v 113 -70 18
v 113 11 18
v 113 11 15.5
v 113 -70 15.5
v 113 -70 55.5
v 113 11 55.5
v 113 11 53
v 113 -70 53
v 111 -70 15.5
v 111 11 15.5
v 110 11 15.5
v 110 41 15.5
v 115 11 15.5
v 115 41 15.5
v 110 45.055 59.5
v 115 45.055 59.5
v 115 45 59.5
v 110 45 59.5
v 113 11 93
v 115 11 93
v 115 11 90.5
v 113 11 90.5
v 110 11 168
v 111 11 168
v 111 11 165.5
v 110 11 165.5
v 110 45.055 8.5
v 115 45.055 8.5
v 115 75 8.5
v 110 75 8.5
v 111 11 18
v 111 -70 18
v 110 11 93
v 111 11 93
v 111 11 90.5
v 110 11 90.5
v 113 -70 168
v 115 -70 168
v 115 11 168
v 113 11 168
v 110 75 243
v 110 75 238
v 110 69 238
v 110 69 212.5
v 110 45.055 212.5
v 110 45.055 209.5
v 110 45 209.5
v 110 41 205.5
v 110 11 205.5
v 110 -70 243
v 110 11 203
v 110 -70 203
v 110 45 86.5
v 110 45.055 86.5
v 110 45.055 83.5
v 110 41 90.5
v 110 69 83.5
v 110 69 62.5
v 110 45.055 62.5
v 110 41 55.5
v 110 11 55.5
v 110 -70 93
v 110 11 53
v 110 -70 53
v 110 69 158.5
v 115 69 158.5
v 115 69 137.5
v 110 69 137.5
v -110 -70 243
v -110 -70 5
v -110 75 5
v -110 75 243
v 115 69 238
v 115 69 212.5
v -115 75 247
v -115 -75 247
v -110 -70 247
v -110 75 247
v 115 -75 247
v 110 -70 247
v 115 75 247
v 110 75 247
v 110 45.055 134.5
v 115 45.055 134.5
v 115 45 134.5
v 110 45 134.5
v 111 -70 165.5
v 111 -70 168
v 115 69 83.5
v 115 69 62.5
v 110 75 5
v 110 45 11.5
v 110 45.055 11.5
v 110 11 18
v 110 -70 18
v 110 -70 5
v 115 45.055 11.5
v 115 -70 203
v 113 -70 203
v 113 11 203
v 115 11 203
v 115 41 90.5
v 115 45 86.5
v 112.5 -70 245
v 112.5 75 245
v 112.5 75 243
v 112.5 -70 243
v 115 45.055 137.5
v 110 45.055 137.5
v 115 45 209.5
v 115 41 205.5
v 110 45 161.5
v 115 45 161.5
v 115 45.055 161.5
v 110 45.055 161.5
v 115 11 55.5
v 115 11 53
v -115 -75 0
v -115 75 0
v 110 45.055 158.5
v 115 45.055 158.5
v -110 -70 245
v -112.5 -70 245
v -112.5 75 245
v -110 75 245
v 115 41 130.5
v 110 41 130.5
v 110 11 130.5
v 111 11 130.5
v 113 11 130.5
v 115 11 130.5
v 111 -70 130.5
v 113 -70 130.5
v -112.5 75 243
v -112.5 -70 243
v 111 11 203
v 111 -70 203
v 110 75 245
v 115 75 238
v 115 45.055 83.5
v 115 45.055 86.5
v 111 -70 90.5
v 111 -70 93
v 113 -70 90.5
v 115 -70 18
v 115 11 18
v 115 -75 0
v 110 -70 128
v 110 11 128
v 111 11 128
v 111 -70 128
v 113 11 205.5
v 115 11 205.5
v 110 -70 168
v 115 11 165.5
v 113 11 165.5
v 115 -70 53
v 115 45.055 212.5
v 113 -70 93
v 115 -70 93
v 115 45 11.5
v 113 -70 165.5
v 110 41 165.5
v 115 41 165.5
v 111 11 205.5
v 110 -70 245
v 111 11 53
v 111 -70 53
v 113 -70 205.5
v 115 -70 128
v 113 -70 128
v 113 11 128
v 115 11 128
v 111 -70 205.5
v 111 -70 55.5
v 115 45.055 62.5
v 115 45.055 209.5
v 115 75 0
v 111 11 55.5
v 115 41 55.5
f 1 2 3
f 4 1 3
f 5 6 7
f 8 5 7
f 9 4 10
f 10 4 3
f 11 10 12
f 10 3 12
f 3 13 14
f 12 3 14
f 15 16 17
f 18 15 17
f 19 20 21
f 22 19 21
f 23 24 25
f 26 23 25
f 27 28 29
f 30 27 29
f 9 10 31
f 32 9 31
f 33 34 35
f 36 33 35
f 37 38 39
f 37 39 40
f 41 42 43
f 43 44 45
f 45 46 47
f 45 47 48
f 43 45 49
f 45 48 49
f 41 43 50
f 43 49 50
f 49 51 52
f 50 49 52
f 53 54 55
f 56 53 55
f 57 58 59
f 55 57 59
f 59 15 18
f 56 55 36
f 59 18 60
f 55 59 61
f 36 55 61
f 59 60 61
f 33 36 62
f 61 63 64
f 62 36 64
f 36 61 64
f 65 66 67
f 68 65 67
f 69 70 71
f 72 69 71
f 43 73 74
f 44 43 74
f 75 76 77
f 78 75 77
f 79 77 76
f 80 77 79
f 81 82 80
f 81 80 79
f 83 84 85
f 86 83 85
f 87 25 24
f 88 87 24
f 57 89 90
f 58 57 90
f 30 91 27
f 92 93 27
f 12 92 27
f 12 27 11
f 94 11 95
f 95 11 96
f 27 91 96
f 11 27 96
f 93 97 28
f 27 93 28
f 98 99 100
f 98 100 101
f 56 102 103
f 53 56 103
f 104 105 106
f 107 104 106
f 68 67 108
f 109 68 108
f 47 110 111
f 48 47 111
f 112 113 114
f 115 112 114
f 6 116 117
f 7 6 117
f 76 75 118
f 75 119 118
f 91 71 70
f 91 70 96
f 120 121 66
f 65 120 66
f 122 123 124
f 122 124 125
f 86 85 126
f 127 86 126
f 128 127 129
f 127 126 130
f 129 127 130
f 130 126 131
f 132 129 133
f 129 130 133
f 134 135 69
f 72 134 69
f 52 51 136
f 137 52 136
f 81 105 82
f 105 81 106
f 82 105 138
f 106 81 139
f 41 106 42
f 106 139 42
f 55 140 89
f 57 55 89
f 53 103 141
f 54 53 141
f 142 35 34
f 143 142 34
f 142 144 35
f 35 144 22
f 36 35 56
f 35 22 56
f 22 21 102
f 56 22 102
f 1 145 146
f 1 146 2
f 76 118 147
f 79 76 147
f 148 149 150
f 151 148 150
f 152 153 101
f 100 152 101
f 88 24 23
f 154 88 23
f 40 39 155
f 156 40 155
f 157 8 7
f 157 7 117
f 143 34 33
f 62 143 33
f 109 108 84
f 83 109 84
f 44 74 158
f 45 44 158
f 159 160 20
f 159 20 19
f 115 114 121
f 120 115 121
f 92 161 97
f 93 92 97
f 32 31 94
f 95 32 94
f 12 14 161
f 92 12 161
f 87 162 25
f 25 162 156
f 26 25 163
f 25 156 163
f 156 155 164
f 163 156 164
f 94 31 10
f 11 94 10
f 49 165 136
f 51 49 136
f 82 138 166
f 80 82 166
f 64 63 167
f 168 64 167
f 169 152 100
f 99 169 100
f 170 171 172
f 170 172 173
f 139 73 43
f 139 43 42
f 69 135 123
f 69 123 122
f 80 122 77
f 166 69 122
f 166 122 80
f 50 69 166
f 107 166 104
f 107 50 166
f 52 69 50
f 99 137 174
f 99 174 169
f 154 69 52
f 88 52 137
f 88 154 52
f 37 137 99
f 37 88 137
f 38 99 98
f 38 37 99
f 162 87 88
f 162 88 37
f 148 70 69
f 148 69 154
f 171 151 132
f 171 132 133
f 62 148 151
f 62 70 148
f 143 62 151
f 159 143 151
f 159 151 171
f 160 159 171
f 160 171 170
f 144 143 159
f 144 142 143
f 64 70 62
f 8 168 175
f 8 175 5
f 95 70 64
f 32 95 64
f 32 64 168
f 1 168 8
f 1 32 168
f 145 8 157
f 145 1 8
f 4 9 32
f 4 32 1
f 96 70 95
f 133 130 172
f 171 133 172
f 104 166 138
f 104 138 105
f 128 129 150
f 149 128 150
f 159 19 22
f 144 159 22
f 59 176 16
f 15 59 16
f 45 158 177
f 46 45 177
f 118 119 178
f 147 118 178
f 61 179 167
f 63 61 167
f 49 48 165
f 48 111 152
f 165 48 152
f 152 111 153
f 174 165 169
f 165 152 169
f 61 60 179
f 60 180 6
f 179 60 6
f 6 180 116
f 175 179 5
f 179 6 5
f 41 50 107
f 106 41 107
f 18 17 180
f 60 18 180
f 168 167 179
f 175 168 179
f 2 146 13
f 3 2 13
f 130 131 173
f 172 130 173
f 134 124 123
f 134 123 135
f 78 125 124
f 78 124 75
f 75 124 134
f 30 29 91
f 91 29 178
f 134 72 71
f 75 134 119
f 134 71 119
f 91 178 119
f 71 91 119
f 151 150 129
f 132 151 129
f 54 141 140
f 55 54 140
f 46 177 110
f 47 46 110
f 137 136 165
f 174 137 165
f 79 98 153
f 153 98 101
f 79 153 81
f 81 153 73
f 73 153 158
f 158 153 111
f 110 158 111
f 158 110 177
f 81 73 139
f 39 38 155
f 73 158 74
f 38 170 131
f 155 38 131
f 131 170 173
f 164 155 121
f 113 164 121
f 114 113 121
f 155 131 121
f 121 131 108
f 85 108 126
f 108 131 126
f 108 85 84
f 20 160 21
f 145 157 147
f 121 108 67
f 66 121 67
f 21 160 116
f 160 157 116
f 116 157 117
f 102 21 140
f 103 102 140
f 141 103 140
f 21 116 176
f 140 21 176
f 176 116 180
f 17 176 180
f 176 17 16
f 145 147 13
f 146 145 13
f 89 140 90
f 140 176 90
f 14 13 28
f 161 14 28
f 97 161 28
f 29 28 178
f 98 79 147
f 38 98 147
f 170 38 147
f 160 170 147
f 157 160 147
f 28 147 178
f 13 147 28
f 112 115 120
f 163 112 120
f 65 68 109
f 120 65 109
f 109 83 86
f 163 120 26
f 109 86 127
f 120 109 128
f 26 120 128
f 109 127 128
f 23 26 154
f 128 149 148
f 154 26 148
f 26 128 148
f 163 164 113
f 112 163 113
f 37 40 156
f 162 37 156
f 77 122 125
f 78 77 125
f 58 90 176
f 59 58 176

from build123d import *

# Parameters (mm, degrees)
SZKIC1_W                    = 230
SZKIC1_H                    = 150
DODANIE_WYCI_GNI_CIE1_DEPTH = 5
DODANIE_WYCI_GNI_CIE2_DEPTH = 242
WYTNIJ_WYCI_GNI_CIE1_REACH  = 347.737
SZKIC4_W                    = 30
SZKIC4_H                    = 6
WYTNIJ_WYCI_GNI_CIE2_DEPTH  = 5
SZKIC7_W                    = 2.5
SZKIC7_H                    = 2
WYTNIJ_WYCI_GNI_CIE3_DEPTH  = 145


with BuildPart() as part:
    # Szkic1 → Dodanie-wyciągnięcie1 (new body)
    with BuildSketch(Plane.XY):
        Rectangle(SZKIC1_W, SZKIC1_H)
    extrude(amount=DODANIE_WYCI_GNI_CIE1_DEPTH)

    # Szkic3 → Dodanie-wyciągnięcie2 (add)
    with BuildSketch(Plane.XY.offset(5)):
        Polygon((115, -75), (115, 75), (110, 75), (110, 70), (110, -70), (-110, -70), (-110, 70), (-110, 75), (-115, 75), (-115, -75), align=None)
    extrude(amount=DODANIE_WYCI_GNI_CIE2_DEPTH)

    # Szkic4 → Wytnij-wyciągnięcie1 (cut, up to next)
    with BuildSketch(Plane(origin=(115, 0, 0), x_dir=(0, 0, -1), z_dir=(1, 0, 0)), mode=Mode.PRIVATE) as wytnij_wyci_gni_cie1_sk1:
        with Locations((-223, 72)):
            Rectangle(SZKIC4_W, SZKIC4_H)
    wytnij_wyci_gni_cie1_tool1 = extrude(wytnij_wyci_gni_cie1_sk1.sketch, amount=-WYTNIJ_WYCI_GNI_CIE1_REACH, mode=Mode.PRIVATE) & part.part
    # Szkic4 → Wytnij-wyciągnięcie1 (cut, up to next)
    with BuildSketch(Plane(origin=(115, 0, 0), x_dir=(0, 0, -1), z_dir=(1, 0, 0)), mode=Mode.PRIVATE) as wytnij_wyci_gni_cie1_sk2:
        with Locations((-148, 72)):
            Rectangle(SZKIC4_W, SZKIC4_H)
    wytnij_wyci_gni_cie1_tool2 = extrude(wytnij_wyci_gni_cie1_sk2.sketch, amount=-WYTNIJ_WYCI_GNI_CIE1_REACH, mode=Mode.PRIVATE) & part.part
    # Szkic4 → Wytnij-wyciągnięcie1 (cut, up to next)
    with BuildSketch(Plane(origin=(115, 0, 0), x_dir=(0, 0, -1), z_dir=(1, 0, 0)), mode=Mode.PRIVATE) as wytnij_wyci_gni_cie1_sk3:
        with Locations((-73, 72)):
            Rectangle(SZKIC4_W, SZKIC4_H)
    wytnij_wyci_gni_cie1_tool3 = extrude(wytnij_wyci_gni_cie1_sk3.sketch, amount=-WYTNIJ_WYCI_GNI_CIE1_REACH, mode=Mode.PRIVATE) & part.part
    add(wytnij_wyci_gni_cie1_tool1.solids().sort_by_distance((115, 72, 223))[0], mode=Mode.SUBTRACT)
    add(wytnij_wyci_gni_cie1_tool2.solids().sort_by_distance((115, 72, 148))[0], mode=Mode.SUBTRACT)
    add(wytnij_wyci_gni_cie1_tool3.solids().sort_by_distance((115, 72, 73))[0], mode=Mode.SUBTRACT)

    # Szkic6 → Wytnij-wyciągnięcie2 (cut)
    with BuildSketch(Plane(origin=(115, 0, 0), x_dir=(0, 0, -1), z_dir=(1, 0, 0))):
        Polygon((-11.5, 45), (-11.5, 45.054636006), (-8.5, 45.054636006), (-8.5, 75), (-58, 75), (-58, 69), (-62.5, 69), (-62.5, 45.054636006), (-59.5, 45.054636006), (-59.5, 45), (-55.5, 41), (-55.5, 11), (-15.5, 11), (-15.5, 41), align=None)
        Polygon((-83.5, 45.054636006), (-83.5, 69), (-88, 69), (-88, 75), (-133, 75), (-133, 69), (-137.5, 69), (-137.5, 45.054636006), (-134.5, 45.054636006), (-134.5, 45), (-130.5, 41), (-130.5, 11), (-90.5, 11), (-90.5, 41), (-86.5, 45), (-86.5, 45.054636006), align=None)
        Polygon((-158.5, 45.054636006), (-158.5, 69), (-163, 69), (-163, 75), (-208, 75), (-208, 69), (-212.5, 69), (-212.5, 45.054636006), (-209.5, 45.054636006), (-209.5, 45), (-205.5, 41), (-205.5, 11), (-165.5, 11), (-165.5, 41), (-161.5, 45), (-161.5, 45.054636006), align=None)
    extrude(amount=-WYTNIJ_WYCI_GNI_CIE2_DEPTH, mode=Mode.SUBTRACT)

    # Szkic7 → Wytnij-wyciągnięcie3 (cut)
    with BuildSketch(Plane(origin=(0, 75, 0), x_dir=(1, 0, 0), z_dir=(0, 1, 0))):
        with Locations((-111.25, -244)):
            Rectangle(SZKIC7_W, SZKIC7_H)
        with Locations((111.25, -244)):
            Rectangle(SZKIC7_W, SZKIC7_H)
        Polygon((111, -203), (111, -205.5), (113, -205.5), (113, -203), (115, -203), (115, -168), (113, -168), (113, -165.5), (111, -165.5), (111, -168), (110, -168), (110, -203), align=None)
        Polygon((111, -128), (111, -130.5), (113, -130.5), (113, -128), (115, -128), (115, -93), (113, -93), (113, -90.5), (111, -90.5), (111, -93), (110, -93), (110, -128), align=None)
        Polygon((111, -53), (111, -55.5), (113, -55.5), (113, -53), (115, -53), (115, -18), (113, -18), (113, -15.5), (111, -15.5), (111, -18), (110, -18), (110, -53), align=None)
    extrude(amount=-WYTNIJ_WYCI_GNI_CIE3_DEPTH, mode=Mode.SUBTRACT)


solid = part.part
